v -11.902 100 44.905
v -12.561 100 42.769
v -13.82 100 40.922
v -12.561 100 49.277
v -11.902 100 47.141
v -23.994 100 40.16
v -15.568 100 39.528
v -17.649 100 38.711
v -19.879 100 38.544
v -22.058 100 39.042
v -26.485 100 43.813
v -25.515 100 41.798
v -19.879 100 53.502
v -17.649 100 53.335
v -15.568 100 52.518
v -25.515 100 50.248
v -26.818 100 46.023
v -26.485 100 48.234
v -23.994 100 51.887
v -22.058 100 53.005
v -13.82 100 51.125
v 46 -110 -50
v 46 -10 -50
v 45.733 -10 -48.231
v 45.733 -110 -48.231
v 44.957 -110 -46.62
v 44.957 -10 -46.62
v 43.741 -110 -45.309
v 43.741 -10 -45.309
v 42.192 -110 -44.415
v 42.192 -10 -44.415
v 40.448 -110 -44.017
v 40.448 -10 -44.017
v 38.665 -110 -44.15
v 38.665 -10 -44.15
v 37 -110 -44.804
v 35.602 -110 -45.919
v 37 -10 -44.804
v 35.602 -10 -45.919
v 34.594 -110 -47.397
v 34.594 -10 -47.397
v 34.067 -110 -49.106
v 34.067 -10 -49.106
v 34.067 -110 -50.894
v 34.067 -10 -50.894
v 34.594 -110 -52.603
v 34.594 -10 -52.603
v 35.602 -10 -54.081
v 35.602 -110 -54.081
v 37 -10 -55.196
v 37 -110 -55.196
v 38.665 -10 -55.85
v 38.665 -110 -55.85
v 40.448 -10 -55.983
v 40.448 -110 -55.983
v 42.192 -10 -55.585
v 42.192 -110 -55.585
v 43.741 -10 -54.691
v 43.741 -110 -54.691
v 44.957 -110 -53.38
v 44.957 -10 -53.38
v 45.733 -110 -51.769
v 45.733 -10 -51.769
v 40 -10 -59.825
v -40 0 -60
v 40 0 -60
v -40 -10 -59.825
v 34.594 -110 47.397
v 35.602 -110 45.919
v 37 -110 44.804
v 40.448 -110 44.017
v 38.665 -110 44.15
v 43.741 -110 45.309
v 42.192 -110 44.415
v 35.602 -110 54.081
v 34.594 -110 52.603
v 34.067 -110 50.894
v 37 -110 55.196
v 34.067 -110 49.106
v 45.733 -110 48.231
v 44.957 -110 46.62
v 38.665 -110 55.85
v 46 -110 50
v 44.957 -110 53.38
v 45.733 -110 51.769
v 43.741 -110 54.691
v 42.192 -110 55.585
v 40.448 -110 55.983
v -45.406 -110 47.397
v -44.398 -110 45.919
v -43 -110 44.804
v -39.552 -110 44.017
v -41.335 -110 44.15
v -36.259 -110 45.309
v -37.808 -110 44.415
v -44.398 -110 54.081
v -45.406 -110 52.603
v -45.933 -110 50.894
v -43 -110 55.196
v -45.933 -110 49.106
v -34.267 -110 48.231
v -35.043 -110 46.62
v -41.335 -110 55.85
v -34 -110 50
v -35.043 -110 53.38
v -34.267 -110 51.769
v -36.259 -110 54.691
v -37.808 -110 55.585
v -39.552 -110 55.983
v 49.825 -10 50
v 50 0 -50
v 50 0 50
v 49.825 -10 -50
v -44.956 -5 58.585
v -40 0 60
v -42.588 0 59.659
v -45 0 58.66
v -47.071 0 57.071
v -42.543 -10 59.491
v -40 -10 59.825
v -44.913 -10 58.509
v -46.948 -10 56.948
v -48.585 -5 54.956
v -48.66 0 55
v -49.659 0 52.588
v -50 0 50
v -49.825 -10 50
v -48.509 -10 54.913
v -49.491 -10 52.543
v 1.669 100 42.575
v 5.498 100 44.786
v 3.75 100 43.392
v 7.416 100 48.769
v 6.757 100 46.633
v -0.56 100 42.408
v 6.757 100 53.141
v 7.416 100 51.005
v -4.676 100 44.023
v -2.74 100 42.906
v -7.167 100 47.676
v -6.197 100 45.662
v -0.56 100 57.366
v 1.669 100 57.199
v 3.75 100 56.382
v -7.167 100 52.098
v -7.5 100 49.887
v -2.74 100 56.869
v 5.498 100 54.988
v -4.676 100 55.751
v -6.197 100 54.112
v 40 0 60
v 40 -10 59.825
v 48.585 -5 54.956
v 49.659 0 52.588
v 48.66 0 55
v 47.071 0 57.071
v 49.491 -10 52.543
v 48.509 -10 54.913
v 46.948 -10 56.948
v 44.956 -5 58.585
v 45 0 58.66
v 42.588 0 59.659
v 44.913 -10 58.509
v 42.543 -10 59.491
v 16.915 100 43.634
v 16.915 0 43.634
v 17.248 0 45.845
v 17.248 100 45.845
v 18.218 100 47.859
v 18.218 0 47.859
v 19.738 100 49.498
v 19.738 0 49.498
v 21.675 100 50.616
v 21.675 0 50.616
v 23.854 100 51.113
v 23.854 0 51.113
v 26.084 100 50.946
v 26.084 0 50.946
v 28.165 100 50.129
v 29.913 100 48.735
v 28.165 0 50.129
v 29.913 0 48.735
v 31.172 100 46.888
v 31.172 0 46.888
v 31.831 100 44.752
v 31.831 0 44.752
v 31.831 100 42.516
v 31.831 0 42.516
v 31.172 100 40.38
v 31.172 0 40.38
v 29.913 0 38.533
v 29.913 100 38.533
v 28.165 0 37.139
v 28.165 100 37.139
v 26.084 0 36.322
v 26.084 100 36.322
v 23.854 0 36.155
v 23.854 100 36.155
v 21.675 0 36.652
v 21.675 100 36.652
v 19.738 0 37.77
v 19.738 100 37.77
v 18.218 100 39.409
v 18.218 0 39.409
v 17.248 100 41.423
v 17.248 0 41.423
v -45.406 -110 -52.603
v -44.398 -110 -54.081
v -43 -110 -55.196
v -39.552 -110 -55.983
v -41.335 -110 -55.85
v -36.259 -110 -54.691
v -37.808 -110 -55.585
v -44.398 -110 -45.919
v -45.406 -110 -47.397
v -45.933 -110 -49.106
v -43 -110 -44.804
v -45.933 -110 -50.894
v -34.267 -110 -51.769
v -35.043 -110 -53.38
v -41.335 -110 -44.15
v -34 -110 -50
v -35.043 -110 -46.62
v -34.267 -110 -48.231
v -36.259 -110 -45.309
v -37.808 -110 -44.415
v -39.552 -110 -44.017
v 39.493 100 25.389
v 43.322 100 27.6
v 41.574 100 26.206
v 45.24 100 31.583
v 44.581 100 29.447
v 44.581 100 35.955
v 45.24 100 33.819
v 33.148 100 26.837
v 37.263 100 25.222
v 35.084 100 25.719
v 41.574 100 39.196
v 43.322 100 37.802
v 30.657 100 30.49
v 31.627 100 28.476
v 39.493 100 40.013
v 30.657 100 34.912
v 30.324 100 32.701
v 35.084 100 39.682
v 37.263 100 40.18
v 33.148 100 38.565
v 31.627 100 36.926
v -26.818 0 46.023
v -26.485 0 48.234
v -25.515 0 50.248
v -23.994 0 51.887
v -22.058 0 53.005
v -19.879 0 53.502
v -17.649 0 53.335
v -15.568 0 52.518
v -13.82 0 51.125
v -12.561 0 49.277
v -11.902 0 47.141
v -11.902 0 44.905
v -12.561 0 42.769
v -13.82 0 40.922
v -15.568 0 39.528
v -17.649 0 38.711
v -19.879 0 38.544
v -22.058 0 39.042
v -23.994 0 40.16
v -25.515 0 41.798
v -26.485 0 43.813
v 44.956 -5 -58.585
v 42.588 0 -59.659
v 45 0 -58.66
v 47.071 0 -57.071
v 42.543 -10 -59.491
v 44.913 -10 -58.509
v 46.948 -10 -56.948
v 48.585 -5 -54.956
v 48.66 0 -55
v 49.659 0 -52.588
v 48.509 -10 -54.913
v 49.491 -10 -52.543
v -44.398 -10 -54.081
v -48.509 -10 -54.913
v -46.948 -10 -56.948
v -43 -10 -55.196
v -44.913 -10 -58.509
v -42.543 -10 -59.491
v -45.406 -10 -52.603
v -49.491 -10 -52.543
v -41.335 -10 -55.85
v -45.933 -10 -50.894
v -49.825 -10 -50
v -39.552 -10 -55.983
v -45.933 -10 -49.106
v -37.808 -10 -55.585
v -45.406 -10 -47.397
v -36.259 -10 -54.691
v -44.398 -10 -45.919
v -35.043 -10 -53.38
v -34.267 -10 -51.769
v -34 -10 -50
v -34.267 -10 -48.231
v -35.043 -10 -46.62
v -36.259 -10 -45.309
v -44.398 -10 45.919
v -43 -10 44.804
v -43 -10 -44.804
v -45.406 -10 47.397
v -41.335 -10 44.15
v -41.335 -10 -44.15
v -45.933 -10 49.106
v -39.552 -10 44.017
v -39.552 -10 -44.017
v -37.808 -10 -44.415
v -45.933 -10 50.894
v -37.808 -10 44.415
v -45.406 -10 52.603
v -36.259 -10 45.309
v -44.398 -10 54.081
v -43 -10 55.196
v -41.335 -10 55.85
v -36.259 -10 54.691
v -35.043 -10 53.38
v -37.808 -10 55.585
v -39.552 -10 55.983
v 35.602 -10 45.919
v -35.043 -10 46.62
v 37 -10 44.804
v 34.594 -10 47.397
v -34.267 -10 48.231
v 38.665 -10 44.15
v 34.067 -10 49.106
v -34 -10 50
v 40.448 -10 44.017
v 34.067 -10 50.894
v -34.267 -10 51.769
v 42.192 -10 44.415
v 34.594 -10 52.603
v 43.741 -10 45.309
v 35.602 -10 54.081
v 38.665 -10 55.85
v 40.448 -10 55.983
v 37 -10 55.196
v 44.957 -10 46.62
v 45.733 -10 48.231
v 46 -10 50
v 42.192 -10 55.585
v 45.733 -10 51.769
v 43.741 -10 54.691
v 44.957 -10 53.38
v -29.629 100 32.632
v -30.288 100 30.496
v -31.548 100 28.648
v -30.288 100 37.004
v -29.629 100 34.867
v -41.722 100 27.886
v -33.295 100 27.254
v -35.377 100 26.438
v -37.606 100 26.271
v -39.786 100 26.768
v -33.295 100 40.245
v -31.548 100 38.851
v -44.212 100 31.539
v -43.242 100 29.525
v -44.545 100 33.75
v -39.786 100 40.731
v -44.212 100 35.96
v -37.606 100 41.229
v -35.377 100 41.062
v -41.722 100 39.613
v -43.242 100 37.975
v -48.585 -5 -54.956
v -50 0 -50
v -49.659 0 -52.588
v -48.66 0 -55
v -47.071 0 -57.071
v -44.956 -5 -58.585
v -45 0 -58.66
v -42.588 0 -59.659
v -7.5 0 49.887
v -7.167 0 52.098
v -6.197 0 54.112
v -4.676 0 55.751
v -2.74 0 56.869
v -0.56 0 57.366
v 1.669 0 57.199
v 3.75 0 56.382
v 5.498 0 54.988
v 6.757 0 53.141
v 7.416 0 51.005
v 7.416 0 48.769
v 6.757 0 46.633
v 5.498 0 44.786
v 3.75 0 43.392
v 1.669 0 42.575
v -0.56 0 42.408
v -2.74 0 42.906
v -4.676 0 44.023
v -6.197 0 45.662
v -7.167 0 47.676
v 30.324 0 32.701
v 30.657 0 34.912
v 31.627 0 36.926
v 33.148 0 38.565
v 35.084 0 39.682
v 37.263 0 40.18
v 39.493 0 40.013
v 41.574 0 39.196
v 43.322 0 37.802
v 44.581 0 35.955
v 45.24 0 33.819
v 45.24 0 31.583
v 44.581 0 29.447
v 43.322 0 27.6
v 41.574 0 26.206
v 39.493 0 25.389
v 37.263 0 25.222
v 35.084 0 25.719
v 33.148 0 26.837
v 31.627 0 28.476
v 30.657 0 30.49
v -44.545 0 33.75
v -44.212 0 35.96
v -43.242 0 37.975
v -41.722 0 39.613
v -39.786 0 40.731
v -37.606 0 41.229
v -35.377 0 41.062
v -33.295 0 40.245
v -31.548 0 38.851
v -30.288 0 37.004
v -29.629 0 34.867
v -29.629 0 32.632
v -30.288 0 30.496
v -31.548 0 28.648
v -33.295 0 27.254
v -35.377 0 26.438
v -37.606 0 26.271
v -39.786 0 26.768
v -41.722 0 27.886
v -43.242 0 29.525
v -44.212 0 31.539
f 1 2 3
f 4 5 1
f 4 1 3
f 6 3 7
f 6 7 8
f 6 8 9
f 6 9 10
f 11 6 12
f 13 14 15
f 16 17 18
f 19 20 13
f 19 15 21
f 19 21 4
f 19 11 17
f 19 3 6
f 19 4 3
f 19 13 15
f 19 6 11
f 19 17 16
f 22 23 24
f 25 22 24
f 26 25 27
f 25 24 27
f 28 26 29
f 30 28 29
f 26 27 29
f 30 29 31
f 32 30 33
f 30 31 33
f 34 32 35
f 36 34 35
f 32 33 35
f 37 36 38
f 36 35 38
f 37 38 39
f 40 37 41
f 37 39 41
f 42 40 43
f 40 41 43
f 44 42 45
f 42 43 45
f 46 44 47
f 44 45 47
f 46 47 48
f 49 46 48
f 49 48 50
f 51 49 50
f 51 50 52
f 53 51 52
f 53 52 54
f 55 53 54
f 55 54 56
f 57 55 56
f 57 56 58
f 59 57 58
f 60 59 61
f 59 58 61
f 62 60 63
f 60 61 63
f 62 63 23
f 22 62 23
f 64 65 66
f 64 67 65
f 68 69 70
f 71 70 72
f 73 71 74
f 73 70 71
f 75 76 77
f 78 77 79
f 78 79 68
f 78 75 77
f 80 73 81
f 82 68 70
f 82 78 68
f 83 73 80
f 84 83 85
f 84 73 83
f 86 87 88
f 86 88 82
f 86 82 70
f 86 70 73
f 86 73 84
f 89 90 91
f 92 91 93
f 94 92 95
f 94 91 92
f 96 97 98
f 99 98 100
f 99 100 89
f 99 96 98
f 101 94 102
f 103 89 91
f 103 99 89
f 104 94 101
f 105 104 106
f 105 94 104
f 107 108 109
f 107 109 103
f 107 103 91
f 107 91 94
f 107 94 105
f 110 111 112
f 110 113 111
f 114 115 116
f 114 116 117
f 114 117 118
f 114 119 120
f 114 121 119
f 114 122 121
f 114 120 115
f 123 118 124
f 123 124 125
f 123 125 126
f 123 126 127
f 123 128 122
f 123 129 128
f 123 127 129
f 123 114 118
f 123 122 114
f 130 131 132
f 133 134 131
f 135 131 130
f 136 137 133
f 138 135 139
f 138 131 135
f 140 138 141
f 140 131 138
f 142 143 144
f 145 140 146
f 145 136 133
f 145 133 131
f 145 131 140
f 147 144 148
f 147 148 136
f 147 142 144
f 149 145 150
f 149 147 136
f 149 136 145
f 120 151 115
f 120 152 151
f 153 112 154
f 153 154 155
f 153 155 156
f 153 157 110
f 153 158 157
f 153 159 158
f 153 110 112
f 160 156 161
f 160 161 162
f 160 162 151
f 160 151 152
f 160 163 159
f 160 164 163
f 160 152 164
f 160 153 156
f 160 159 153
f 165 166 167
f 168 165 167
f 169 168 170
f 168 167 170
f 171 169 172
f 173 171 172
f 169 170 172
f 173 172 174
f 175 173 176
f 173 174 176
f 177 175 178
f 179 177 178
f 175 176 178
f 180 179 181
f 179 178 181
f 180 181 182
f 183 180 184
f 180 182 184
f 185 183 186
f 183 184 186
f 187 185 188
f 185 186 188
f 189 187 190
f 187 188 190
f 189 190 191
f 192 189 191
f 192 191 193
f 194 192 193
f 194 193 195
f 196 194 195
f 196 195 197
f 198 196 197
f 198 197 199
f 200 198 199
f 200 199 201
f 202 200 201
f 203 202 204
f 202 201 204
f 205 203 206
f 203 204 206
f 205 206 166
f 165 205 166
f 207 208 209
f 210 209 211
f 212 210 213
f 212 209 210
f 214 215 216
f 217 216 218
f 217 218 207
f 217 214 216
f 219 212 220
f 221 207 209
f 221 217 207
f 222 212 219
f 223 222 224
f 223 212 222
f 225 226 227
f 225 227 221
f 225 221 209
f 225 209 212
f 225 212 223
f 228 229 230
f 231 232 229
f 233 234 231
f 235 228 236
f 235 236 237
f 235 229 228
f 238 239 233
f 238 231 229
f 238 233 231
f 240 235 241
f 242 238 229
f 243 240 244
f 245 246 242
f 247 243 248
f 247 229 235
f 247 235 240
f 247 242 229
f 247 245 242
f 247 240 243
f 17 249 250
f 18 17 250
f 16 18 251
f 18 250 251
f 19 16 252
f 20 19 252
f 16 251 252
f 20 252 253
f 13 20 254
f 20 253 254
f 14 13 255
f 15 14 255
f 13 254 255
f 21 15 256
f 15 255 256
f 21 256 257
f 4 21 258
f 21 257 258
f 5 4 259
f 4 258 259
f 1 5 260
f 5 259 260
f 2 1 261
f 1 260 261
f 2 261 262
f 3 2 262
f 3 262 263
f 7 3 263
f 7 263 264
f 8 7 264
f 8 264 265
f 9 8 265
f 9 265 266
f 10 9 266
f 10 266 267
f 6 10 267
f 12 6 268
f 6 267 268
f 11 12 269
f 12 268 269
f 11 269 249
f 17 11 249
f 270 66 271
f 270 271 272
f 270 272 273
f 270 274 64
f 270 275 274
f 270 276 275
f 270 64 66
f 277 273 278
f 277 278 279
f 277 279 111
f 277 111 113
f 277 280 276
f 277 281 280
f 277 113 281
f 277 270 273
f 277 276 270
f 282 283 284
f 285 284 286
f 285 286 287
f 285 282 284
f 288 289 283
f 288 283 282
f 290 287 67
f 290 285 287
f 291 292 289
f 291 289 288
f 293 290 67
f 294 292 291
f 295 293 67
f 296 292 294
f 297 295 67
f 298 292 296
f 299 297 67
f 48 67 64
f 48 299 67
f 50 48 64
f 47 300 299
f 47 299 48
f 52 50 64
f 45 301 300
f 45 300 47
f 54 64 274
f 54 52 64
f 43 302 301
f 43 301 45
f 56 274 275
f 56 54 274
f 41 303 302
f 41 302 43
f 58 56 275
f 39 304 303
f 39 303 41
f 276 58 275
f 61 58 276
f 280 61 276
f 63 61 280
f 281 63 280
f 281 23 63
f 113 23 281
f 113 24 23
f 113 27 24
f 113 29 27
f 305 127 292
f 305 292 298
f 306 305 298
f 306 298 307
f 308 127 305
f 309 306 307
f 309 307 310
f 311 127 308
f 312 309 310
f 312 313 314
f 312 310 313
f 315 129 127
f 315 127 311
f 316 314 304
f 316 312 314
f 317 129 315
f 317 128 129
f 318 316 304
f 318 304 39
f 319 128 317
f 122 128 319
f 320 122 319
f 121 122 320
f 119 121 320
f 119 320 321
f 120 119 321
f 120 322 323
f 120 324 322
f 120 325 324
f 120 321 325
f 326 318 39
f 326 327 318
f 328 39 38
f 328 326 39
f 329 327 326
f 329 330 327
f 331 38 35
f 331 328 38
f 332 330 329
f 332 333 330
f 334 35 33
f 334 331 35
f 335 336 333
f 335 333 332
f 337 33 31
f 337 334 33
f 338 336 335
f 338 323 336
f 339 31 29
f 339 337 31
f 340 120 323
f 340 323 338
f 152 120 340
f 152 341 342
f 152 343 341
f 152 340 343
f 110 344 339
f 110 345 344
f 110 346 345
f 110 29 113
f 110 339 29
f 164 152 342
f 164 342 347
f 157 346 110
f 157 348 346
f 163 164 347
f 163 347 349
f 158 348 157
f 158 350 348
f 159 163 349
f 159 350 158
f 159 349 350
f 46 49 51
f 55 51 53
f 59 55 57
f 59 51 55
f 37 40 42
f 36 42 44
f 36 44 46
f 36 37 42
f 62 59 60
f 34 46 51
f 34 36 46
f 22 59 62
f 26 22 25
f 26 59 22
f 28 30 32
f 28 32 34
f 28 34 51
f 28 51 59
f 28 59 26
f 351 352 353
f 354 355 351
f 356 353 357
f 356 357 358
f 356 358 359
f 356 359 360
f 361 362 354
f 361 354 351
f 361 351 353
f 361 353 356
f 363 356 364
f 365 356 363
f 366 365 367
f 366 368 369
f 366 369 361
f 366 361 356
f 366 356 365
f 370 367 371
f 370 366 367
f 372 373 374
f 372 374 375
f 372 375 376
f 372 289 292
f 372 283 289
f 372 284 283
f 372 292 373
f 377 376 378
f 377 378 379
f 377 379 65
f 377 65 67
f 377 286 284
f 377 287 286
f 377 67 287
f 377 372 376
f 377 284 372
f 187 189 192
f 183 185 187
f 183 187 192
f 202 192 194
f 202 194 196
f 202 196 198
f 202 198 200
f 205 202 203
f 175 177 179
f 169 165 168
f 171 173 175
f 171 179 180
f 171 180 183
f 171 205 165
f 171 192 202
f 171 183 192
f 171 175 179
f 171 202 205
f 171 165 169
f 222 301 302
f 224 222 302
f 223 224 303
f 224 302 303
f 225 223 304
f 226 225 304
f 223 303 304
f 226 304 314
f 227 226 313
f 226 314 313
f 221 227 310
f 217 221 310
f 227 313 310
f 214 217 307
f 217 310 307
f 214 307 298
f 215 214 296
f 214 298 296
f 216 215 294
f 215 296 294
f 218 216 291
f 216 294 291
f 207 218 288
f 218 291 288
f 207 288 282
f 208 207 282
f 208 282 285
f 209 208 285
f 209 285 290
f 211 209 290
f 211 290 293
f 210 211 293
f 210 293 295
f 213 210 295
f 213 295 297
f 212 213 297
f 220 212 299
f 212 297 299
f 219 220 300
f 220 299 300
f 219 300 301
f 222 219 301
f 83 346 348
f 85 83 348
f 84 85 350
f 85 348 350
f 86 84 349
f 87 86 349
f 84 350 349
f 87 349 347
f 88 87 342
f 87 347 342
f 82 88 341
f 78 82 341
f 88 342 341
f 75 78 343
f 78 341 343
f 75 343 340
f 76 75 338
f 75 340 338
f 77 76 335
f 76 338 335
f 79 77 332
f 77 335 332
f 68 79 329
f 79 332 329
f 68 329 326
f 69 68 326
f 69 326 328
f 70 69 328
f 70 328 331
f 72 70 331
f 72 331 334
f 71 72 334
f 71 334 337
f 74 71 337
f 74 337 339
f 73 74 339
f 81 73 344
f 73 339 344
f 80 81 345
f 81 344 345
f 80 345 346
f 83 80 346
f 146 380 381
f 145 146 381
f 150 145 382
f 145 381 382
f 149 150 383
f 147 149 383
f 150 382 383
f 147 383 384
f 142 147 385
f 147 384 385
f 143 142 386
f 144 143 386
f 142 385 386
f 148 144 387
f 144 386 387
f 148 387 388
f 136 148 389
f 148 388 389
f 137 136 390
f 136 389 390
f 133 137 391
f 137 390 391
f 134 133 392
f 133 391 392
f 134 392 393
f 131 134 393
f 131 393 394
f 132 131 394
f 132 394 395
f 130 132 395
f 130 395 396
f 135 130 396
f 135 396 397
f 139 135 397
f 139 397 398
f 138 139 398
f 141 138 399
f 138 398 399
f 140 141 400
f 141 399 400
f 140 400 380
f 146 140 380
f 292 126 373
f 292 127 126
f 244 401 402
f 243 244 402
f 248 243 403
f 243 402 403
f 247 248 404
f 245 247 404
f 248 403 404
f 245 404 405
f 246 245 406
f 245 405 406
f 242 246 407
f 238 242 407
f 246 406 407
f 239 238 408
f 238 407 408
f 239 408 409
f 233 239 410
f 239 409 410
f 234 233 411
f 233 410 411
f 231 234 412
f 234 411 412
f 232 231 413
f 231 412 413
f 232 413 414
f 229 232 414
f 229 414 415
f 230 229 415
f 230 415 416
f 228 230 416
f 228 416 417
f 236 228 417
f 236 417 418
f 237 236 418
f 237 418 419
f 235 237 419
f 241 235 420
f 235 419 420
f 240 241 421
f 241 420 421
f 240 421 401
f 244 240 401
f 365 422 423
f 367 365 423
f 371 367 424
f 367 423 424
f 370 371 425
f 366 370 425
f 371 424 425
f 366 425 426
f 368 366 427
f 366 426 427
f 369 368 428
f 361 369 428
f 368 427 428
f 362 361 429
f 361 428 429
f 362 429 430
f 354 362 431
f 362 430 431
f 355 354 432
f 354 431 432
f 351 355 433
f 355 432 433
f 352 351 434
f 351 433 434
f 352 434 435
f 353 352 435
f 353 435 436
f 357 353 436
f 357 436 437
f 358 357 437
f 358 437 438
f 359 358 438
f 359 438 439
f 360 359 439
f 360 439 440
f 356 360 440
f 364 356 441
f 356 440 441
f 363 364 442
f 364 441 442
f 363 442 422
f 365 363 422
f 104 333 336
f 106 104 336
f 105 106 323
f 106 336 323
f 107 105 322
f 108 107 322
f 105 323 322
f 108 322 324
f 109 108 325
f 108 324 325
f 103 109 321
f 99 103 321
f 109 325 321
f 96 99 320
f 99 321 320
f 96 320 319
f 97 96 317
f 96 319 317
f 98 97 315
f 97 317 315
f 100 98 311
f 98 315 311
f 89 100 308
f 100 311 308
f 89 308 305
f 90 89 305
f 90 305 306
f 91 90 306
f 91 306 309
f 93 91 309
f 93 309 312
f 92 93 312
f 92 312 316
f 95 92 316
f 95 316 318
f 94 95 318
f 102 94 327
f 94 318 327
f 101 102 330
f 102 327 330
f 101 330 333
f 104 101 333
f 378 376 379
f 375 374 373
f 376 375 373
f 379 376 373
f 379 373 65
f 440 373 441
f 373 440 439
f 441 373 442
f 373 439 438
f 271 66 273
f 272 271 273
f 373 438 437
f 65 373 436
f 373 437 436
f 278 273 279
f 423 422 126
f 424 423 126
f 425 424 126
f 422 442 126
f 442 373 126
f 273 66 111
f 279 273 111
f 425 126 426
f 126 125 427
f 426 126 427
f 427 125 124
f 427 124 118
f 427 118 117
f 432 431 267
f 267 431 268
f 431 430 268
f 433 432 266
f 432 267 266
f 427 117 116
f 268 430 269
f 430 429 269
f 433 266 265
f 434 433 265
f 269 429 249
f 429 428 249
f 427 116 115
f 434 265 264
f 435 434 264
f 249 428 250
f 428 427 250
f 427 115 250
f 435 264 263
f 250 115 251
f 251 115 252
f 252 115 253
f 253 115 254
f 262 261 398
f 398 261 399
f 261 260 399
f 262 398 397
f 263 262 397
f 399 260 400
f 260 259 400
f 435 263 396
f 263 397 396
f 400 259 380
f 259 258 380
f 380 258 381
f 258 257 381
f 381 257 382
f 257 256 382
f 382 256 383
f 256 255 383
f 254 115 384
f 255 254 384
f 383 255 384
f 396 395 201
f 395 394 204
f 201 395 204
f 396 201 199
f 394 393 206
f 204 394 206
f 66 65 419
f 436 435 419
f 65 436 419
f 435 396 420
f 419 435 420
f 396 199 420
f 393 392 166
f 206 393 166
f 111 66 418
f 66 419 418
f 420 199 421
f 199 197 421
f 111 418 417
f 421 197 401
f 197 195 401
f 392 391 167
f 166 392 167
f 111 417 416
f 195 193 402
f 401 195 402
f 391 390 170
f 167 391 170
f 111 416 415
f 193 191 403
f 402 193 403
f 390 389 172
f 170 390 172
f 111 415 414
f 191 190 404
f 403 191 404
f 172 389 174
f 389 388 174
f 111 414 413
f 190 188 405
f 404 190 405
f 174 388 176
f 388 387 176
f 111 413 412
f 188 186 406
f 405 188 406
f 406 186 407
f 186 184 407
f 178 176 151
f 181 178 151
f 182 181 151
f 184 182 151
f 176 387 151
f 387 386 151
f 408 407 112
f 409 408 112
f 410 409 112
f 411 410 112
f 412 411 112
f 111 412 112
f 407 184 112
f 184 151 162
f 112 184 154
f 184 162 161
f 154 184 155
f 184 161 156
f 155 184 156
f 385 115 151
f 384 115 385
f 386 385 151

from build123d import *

# Parameters (mm, degrees)
F1_DEPTH = 10
F1_TAPER = 1
F2_R     = 6
F3_DEPTH = 100
F4_R     = 7.5
F5_DEPTH = 100


with BuildPart() as f1:
    # F0 (on Front) → F1 (new body)
    with BuildSketch(Plane.XZ):
        with BuildLine():
            ThreePointArc((50, 50), (47.0710678119, 57.0710678119), (40, 60))
            Line((40, 60), (-40, 60))
            ThreePointArc((-40, 60), (-47.0710678119, 57.0710678119), (-50, 50))
            Line((-50, 50), (-50, -50))
            ThreePointArc((-50, -50), (-47.0710678119, -57.0710678119), (-40, -60))
            Line((-40, -60), (40, -60))
            ThreePointArc((40, -60), (47.0710678119, -57.0710678119), (50, -50))
            Line((50, -50), (50, 50))
        make_face()
    extrude(amount=F1_DEPTH, taper=F1_TAPER)

    # F2 (on face) → F3 (join)
    with BuildSketch(Plane.XZ.offset(10)):
        with Locations((-40, 50)):
            Circle(F2_R)
        with Locations((40, 50)):
            Circle(F2_R)
        with Locations((40, -50)):
            Circle(F2_R)
        with Locations((-40, -50)):
            Circle(F2_R)
    extrude(amount=F3_DEPTH)

    # F4 (on face) → F5 (join)
    with BuildSketch(Plane(origin=(0, 0, 0), x_dir=(-1, 0, 0), z_dir=(0, 1, 0))):
        with Locations((-37.8239102132, 32.7009451879)):
            Circle(F4_R)
        with Locations((-24.4146151623, 43.6340069955)):
            Circle(F4_R)
        with Locations((1.0837e-06, 49.8871542513)):
            Circle(F4_R)
        with Locations((19.318186678, 46.0232570767)):
            Circle(F4_R)
        with Locations((37.0454452932, 33.7496697903)):
            Circle(F4_R)
    extrude(amount=F5_DEPTH)


solid = f1.part
